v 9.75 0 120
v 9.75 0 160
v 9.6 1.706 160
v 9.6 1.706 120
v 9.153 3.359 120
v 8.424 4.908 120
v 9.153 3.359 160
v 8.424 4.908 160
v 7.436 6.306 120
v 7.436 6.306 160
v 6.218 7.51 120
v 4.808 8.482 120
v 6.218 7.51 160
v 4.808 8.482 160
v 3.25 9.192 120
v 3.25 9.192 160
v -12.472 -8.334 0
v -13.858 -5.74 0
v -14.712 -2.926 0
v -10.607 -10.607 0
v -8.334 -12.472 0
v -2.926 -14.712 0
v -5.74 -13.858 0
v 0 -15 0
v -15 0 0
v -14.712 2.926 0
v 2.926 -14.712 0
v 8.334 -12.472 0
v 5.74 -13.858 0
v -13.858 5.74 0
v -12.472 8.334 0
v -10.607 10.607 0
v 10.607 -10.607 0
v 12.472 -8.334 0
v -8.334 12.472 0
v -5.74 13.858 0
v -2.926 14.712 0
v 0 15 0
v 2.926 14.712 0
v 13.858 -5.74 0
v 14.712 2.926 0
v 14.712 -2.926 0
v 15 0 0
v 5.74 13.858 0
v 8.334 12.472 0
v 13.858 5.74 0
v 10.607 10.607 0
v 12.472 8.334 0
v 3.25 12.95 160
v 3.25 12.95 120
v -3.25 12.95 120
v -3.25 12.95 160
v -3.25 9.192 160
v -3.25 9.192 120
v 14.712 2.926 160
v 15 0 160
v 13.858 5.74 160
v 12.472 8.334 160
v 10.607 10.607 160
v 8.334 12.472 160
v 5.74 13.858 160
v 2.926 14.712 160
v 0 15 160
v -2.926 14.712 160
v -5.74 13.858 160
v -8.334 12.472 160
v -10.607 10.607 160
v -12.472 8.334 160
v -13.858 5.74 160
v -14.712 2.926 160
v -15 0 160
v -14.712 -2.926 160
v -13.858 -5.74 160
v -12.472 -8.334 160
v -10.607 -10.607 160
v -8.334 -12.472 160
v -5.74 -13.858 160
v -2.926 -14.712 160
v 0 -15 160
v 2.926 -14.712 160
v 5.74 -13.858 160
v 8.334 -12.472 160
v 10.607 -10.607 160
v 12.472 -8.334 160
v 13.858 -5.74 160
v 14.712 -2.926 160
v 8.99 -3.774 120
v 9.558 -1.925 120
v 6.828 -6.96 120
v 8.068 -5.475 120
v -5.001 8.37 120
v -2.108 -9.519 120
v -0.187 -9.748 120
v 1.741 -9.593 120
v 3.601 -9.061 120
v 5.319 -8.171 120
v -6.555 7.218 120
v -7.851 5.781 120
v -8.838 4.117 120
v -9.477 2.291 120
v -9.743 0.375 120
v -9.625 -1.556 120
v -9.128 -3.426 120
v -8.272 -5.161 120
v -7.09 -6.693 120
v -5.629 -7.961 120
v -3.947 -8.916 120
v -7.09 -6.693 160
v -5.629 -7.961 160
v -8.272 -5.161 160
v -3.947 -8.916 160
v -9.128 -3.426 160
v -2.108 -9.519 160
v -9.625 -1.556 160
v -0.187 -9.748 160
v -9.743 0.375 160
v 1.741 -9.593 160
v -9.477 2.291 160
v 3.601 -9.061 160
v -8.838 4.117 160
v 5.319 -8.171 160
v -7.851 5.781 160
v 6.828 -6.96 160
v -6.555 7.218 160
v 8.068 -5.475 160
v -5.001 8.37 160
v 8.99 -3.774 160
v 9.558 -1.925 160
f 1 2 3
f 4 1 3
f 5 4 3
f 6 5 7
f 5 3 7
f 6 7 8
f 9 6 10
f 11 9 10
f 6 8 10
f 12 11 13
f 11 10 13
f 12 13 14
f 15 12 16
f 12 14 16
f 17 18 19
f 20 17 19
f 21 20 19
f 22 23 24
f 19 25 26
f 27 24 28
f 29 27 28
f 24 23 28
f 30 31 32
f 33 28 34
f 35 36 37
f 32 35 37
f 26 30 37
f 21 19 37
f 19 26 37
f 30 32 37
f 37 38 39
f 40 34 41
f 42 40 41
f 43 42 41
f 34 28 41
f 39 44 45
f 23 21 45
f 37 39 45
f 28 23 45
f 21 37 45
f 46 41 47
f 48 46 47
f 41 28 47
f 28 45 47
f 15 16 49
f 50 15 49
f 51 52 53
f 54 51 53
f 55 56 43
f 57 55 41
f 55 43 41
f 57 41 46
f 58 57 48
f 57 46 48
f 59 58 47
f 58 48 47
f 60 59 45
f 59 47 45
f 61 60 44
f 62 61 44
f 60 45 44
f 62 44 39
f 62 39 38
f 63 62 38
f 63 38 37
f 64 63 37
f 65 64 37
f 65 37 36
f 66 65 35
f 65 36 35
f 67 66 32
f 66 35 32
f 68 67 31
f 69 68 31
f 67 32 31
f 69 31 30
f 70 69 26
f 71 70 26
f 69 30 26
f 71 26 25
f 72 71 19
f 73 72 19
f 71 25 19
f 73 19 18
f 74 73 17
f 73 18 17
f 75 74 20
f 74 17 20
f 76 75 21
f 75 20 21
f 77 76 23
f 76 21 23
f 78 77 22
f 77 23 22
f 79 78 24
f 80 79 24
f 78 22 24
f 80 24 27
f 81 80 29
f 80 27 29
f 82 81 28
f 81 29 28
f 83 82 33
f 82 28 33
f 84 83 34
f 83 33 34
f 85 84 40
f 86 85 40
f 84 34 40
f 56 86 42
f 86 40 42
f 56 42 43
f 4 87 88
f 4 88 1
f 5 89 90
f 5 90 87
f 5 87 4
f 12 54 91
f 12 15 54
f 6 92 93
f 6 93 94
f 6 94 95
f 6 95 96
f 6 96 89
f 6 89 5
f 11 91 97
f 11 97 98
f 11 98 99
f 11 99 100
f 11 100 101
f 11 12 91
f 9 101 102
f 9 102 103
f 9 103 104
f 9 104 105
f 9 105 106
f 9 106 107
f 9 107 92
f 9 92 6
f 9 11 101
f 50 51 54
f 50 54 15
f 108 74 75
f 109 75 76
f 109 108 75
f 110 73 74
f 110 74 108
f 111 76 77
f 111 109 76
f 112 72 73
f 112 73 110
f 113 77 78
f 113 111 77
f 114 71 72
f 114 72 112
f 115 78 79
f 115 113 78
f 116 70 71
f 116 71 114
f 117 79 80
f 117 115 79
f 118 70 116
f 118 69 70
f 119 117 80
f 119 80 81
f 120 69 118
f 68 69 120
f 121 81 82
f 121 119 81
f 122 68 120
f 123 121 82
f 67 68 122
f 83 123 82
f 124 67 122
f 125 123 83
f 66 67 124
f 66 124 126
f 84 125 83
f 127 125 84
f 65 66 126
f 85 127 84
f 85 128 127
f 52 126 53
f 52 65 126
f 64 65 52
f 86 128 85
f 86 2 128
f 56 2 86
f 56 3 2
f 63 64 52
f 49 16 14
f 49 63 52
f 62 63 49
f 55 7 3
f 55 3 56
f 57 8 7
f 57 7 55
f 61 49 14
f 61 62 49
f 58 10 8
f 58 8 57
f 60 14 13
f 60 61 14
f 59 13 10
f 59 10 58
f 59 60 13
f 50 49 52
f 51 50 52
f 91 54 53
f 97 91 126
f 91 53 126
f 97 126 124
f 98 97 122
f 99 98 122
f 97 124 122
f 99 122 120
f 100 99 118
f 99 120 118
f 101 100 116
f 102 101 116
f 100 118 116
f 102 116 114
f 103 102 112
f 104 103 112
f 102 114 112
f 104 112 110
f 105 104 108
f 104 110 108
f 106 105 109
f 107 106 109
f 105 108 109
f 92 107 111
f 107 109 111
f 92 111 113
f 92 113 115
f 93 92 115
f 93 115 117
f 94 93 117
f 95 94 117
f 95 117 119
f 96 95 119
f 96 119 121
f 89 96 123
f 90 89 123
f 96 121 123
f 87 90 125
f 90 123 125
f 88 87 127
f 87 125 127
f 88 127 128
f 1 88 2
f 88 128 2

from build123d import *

# Parameters (mm, degrees)
F0_R     = 15
F1_DEPTH = 160
F3_DEPTH = 40


# Not quite as in the source:
# - a feature names something its author has since deleted; it is built from what else it names


with BuildPart() as f1:
    # F0 (on Top) → F1 (new body)
    with BuildSketch(Plane.XY):
        Circle(F0_R)
    extrude(amount=F1_DEPTH)

    # F2 (on face) → F3 (cut)
    with BuildSketch(Plane.XY.offset(160)):
        with BuildLine():
            ThreePointArc((-3.25, 9.1923881554), (-5.6291651246, -7.960841664), (9.75, 0))
            ThreePointArc((9.75, 0), (7.960841664, 5.6291651246), (3.25, 9.1923881554))
            Line((3.25, 9.1923881554), (3.25, 6.55))
            Line((3.25, 6.55), (-3.25, 6.55))
            Line((-3.25, 6.55), (-3.25, 9.1923881554))
        make_face()
        with BuildLine():
            Line((3.25, 6.55), (3.25, 9.1923881554))
            ThreePointArc((3.25, 9.1923881554), (0, 9.75), (-3.25, 9.1923881554))
            Line((-3.25, 9.1923881554), (-3.25, 6.55))
            Line((-3.25, 6.55), (3.25, 6.55))
        make_face()
        with BuildLine():
            ThreePointArc((-3.25, 9.1923881554), (0, 9.75), (3.25, 9.1923881554))
            Line((3.25, 9.1923881554), (3.25, 12.95))
            Line((3.25, 12.95), (-3.25, 12.95))
            Line((-3.25, 12.95), (-3.25, 9.1923881554))
        make_face()
    extrude(amount=-F3_DEPTH, mode=Mode.SUBTRACT)


solid = f1.part
